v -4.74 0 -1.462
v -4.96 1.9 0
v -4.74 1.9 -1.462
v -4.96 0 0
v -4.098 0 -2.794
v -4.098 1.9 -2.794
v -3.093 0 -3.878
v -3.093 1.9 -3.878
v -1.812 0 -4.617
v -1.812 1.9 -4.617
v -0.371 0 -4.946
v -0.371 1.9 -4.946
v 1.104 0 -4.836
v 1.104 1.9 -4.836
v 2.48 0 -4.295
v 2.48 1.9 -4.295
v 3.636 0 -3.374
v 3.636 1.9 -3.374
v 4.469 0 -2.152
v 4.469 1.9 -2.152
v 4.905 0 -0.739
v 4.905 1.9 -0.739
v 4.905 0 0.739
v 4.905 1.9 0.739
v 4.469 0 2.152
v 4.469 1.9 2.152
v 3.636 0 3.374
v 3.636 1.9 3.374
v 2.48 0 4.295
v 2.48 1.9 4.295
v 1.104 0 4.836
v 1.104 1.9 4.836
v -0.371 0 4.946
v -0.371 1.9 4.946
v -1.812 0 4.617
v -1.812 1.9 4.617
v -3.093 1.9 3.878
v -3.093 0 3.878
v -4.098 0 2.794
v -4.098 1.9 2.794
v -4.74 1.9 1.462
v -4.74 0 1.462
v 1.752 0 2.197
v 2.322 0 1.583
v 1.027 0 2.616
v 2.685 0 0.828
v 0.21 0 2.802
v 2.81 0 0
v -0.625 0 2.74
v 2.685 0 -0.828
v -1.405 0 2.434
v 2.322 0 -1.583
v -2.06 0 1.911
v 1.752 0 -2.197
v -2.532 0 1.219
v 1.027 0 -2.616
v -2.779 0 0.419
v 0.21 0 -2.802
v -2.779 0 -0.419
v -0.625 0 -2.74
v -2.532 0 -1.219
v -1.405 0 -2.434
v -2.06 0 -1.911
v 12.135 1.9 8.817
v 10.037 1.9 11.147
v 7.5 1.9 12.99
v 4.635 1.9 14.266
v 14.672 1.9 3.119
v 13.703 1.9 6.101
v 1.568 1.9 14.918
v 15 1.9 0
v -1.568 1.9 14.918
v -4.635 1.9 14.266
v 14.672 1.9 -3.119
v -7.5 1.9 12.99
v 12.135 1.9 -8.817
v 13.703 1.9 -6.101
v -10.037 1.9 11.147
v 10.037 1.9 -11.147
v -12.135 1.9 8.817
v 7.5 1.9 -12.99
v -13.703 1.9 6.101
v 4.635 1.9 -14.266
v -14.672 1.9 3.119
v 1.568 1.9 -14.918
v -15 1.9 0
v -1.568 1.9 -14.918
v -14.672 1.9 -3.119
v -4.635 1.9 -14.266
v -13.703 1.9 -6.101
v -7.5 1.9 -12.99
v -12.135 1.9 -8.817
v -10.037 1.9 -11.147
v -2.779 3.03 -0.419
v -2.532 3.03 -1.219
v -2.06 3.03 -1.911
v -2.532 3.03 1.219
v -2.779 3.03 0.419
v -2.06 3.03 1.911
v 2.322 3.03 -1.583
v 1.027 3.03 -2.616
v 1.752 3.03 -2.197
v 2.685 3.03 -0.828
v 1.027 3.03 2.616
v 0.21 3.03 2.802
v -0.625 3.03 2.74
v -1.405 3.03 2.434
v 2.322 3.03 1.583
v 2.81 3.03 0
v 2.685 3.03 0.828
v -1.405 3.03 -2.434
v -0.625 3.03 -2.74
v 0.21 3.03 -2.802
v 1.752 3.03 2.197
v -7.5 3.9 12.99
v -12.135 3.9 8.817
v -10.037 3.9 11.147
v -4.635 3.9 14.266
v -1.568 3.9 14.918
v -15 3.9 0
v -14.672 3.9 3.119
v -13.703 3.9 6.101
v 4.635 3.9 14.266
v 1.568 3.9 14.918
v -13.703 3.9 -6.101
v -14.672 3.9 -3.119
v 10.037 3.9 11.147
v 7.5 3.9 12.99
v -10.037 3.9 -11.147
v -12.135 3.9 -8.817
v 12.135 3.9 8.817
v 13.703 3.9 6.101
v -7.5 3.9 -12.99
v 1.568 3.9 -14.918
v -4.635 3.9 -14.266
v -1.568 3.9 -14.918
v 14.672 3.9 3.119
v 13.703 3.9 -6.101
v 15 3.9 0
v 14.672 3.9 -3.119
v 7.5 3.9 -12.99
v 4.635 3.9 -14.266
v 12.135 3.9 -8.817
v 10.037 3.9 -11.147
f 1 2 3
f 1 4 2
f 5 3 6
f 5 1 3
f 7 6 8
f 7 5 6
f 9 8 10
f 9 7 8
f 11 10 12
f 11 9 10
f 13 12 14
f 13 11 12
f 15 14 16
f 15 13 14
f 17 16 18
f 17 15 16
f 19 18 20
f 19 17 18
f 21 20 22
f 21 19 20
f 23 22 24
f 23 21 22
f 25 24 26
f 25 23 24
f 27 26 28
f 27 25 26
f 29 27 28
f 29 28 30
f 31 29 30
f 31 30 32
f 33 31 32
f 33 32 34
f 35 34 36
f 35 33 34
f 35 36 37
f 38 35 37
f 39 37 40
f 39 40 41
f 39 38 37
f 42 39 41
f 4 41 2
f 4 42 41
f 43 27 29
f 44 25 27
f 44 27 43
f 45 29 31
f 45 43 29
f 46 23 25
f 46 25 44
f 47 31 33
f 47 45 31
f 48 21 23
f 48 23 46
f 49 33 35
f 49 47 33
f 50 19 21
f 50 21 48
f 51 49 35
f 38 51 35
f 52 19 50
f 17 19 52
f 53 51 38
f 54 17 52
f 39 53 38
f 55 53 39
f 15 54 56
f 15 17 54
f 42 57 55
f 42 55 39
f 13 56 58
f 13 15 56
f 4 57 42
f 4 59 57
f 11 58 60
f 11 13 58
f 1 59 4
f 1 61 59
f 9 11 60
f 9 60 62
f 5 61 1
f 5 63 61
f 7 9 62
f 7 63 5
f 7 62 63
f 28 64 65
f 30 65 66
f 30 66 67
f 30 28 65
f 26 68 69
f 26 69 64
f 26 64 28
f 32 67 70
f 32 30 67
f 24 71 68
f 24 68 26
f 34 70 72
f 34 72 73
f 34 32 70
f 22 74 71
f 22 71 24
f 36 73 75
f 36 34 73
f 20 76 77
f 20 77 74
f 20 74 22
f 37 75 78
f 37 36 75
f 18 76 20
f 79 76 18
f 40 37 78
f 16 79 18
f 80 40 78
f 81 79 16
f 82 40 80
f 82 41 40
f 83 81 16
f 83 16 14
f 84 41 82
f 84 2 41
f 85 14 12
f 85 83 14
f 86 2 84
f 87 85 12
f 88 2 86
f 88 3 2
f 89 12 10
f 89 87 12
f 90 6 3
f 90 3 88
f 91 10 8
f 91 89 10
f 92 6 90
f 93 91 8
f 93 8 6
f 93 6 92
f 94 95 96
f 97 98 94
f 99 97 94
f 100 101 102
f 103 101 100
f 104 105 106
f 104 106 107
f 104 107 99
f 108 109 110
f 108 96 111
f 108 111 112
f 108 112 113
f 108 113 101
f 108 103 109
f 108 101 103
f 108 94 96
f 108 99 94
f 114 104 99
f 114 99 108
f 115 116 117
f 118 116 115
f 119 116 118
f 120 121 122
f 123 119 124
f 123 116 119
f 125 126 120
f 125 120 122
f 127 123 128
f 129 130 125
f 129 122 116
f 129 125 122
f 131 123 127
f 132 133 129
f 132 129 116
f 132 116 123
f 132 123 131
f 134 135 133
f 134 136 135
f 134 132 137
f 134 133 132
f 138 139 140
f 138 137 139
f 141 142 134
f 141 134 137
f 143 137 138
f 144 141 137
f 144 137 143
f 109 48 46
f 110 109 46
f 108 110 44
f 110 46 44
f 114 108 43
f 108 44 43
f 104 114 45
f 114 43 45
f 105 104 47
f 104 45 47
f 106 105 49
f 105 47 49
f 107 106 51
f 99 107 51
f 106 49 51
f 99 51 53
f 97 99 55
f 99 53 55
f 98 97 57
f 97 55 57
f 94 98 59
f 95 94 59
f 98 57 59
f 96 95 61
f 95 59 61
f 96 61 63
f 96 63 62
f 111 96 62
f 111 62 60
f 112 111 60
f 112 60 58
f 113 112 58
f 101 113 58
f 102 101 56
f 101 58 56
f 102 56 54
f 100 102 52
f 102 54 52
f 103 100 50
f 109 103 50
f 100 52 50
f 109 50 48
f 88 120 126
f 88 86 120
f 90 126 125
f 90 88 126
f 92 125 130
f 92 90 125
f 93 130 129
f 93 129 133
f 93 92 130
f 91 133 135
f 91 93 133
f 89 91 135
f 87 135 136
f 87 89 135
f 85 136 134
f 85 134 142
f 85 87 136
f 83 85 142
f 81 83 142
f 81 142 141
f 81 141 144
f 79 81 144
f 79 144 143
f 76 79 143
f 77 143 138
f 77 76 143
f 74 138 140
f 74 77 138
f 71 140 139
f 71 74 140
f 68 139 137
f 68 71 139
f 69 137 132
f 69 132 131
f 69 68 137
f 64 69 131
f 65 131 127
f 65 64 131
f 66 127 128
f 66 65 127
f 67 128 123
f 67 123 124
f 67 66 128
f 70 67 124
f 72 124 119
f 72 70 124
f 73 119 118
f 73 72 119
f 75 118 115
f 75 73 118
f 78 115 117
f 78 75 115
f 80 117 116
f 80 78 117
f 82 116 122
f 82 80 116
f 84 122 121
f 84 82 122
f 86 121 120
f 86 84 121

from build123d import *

# Parameters (mm, degrees)
SKETCH2_R          = 2.81
CUT_EXTRUDE1_DEPTH = 3.03


with BuildPart() as part:
    # Sketch1 → Revolve1 (revolve)
    with BuildSketch(Plane.XY):
        Polygon((0, 3.9), (-15, 3.9), (-15, 1.9), (-4.96, 1.9), (-4.96, 0), (0, 0), align=None)
    revolve(axis=Axis((0, 3.9, 0), (0, -1, 0)))

    # Sketch2 → Cut-Extrude1 (cut)
    with BuildSketch(Plane.XZ):
        Circle(SKETCH2_R)
    extrude(amount=-CUT_EXTRUDE1_DEPTH, mode=Mode.SUBTRACT)


solid = part.part
